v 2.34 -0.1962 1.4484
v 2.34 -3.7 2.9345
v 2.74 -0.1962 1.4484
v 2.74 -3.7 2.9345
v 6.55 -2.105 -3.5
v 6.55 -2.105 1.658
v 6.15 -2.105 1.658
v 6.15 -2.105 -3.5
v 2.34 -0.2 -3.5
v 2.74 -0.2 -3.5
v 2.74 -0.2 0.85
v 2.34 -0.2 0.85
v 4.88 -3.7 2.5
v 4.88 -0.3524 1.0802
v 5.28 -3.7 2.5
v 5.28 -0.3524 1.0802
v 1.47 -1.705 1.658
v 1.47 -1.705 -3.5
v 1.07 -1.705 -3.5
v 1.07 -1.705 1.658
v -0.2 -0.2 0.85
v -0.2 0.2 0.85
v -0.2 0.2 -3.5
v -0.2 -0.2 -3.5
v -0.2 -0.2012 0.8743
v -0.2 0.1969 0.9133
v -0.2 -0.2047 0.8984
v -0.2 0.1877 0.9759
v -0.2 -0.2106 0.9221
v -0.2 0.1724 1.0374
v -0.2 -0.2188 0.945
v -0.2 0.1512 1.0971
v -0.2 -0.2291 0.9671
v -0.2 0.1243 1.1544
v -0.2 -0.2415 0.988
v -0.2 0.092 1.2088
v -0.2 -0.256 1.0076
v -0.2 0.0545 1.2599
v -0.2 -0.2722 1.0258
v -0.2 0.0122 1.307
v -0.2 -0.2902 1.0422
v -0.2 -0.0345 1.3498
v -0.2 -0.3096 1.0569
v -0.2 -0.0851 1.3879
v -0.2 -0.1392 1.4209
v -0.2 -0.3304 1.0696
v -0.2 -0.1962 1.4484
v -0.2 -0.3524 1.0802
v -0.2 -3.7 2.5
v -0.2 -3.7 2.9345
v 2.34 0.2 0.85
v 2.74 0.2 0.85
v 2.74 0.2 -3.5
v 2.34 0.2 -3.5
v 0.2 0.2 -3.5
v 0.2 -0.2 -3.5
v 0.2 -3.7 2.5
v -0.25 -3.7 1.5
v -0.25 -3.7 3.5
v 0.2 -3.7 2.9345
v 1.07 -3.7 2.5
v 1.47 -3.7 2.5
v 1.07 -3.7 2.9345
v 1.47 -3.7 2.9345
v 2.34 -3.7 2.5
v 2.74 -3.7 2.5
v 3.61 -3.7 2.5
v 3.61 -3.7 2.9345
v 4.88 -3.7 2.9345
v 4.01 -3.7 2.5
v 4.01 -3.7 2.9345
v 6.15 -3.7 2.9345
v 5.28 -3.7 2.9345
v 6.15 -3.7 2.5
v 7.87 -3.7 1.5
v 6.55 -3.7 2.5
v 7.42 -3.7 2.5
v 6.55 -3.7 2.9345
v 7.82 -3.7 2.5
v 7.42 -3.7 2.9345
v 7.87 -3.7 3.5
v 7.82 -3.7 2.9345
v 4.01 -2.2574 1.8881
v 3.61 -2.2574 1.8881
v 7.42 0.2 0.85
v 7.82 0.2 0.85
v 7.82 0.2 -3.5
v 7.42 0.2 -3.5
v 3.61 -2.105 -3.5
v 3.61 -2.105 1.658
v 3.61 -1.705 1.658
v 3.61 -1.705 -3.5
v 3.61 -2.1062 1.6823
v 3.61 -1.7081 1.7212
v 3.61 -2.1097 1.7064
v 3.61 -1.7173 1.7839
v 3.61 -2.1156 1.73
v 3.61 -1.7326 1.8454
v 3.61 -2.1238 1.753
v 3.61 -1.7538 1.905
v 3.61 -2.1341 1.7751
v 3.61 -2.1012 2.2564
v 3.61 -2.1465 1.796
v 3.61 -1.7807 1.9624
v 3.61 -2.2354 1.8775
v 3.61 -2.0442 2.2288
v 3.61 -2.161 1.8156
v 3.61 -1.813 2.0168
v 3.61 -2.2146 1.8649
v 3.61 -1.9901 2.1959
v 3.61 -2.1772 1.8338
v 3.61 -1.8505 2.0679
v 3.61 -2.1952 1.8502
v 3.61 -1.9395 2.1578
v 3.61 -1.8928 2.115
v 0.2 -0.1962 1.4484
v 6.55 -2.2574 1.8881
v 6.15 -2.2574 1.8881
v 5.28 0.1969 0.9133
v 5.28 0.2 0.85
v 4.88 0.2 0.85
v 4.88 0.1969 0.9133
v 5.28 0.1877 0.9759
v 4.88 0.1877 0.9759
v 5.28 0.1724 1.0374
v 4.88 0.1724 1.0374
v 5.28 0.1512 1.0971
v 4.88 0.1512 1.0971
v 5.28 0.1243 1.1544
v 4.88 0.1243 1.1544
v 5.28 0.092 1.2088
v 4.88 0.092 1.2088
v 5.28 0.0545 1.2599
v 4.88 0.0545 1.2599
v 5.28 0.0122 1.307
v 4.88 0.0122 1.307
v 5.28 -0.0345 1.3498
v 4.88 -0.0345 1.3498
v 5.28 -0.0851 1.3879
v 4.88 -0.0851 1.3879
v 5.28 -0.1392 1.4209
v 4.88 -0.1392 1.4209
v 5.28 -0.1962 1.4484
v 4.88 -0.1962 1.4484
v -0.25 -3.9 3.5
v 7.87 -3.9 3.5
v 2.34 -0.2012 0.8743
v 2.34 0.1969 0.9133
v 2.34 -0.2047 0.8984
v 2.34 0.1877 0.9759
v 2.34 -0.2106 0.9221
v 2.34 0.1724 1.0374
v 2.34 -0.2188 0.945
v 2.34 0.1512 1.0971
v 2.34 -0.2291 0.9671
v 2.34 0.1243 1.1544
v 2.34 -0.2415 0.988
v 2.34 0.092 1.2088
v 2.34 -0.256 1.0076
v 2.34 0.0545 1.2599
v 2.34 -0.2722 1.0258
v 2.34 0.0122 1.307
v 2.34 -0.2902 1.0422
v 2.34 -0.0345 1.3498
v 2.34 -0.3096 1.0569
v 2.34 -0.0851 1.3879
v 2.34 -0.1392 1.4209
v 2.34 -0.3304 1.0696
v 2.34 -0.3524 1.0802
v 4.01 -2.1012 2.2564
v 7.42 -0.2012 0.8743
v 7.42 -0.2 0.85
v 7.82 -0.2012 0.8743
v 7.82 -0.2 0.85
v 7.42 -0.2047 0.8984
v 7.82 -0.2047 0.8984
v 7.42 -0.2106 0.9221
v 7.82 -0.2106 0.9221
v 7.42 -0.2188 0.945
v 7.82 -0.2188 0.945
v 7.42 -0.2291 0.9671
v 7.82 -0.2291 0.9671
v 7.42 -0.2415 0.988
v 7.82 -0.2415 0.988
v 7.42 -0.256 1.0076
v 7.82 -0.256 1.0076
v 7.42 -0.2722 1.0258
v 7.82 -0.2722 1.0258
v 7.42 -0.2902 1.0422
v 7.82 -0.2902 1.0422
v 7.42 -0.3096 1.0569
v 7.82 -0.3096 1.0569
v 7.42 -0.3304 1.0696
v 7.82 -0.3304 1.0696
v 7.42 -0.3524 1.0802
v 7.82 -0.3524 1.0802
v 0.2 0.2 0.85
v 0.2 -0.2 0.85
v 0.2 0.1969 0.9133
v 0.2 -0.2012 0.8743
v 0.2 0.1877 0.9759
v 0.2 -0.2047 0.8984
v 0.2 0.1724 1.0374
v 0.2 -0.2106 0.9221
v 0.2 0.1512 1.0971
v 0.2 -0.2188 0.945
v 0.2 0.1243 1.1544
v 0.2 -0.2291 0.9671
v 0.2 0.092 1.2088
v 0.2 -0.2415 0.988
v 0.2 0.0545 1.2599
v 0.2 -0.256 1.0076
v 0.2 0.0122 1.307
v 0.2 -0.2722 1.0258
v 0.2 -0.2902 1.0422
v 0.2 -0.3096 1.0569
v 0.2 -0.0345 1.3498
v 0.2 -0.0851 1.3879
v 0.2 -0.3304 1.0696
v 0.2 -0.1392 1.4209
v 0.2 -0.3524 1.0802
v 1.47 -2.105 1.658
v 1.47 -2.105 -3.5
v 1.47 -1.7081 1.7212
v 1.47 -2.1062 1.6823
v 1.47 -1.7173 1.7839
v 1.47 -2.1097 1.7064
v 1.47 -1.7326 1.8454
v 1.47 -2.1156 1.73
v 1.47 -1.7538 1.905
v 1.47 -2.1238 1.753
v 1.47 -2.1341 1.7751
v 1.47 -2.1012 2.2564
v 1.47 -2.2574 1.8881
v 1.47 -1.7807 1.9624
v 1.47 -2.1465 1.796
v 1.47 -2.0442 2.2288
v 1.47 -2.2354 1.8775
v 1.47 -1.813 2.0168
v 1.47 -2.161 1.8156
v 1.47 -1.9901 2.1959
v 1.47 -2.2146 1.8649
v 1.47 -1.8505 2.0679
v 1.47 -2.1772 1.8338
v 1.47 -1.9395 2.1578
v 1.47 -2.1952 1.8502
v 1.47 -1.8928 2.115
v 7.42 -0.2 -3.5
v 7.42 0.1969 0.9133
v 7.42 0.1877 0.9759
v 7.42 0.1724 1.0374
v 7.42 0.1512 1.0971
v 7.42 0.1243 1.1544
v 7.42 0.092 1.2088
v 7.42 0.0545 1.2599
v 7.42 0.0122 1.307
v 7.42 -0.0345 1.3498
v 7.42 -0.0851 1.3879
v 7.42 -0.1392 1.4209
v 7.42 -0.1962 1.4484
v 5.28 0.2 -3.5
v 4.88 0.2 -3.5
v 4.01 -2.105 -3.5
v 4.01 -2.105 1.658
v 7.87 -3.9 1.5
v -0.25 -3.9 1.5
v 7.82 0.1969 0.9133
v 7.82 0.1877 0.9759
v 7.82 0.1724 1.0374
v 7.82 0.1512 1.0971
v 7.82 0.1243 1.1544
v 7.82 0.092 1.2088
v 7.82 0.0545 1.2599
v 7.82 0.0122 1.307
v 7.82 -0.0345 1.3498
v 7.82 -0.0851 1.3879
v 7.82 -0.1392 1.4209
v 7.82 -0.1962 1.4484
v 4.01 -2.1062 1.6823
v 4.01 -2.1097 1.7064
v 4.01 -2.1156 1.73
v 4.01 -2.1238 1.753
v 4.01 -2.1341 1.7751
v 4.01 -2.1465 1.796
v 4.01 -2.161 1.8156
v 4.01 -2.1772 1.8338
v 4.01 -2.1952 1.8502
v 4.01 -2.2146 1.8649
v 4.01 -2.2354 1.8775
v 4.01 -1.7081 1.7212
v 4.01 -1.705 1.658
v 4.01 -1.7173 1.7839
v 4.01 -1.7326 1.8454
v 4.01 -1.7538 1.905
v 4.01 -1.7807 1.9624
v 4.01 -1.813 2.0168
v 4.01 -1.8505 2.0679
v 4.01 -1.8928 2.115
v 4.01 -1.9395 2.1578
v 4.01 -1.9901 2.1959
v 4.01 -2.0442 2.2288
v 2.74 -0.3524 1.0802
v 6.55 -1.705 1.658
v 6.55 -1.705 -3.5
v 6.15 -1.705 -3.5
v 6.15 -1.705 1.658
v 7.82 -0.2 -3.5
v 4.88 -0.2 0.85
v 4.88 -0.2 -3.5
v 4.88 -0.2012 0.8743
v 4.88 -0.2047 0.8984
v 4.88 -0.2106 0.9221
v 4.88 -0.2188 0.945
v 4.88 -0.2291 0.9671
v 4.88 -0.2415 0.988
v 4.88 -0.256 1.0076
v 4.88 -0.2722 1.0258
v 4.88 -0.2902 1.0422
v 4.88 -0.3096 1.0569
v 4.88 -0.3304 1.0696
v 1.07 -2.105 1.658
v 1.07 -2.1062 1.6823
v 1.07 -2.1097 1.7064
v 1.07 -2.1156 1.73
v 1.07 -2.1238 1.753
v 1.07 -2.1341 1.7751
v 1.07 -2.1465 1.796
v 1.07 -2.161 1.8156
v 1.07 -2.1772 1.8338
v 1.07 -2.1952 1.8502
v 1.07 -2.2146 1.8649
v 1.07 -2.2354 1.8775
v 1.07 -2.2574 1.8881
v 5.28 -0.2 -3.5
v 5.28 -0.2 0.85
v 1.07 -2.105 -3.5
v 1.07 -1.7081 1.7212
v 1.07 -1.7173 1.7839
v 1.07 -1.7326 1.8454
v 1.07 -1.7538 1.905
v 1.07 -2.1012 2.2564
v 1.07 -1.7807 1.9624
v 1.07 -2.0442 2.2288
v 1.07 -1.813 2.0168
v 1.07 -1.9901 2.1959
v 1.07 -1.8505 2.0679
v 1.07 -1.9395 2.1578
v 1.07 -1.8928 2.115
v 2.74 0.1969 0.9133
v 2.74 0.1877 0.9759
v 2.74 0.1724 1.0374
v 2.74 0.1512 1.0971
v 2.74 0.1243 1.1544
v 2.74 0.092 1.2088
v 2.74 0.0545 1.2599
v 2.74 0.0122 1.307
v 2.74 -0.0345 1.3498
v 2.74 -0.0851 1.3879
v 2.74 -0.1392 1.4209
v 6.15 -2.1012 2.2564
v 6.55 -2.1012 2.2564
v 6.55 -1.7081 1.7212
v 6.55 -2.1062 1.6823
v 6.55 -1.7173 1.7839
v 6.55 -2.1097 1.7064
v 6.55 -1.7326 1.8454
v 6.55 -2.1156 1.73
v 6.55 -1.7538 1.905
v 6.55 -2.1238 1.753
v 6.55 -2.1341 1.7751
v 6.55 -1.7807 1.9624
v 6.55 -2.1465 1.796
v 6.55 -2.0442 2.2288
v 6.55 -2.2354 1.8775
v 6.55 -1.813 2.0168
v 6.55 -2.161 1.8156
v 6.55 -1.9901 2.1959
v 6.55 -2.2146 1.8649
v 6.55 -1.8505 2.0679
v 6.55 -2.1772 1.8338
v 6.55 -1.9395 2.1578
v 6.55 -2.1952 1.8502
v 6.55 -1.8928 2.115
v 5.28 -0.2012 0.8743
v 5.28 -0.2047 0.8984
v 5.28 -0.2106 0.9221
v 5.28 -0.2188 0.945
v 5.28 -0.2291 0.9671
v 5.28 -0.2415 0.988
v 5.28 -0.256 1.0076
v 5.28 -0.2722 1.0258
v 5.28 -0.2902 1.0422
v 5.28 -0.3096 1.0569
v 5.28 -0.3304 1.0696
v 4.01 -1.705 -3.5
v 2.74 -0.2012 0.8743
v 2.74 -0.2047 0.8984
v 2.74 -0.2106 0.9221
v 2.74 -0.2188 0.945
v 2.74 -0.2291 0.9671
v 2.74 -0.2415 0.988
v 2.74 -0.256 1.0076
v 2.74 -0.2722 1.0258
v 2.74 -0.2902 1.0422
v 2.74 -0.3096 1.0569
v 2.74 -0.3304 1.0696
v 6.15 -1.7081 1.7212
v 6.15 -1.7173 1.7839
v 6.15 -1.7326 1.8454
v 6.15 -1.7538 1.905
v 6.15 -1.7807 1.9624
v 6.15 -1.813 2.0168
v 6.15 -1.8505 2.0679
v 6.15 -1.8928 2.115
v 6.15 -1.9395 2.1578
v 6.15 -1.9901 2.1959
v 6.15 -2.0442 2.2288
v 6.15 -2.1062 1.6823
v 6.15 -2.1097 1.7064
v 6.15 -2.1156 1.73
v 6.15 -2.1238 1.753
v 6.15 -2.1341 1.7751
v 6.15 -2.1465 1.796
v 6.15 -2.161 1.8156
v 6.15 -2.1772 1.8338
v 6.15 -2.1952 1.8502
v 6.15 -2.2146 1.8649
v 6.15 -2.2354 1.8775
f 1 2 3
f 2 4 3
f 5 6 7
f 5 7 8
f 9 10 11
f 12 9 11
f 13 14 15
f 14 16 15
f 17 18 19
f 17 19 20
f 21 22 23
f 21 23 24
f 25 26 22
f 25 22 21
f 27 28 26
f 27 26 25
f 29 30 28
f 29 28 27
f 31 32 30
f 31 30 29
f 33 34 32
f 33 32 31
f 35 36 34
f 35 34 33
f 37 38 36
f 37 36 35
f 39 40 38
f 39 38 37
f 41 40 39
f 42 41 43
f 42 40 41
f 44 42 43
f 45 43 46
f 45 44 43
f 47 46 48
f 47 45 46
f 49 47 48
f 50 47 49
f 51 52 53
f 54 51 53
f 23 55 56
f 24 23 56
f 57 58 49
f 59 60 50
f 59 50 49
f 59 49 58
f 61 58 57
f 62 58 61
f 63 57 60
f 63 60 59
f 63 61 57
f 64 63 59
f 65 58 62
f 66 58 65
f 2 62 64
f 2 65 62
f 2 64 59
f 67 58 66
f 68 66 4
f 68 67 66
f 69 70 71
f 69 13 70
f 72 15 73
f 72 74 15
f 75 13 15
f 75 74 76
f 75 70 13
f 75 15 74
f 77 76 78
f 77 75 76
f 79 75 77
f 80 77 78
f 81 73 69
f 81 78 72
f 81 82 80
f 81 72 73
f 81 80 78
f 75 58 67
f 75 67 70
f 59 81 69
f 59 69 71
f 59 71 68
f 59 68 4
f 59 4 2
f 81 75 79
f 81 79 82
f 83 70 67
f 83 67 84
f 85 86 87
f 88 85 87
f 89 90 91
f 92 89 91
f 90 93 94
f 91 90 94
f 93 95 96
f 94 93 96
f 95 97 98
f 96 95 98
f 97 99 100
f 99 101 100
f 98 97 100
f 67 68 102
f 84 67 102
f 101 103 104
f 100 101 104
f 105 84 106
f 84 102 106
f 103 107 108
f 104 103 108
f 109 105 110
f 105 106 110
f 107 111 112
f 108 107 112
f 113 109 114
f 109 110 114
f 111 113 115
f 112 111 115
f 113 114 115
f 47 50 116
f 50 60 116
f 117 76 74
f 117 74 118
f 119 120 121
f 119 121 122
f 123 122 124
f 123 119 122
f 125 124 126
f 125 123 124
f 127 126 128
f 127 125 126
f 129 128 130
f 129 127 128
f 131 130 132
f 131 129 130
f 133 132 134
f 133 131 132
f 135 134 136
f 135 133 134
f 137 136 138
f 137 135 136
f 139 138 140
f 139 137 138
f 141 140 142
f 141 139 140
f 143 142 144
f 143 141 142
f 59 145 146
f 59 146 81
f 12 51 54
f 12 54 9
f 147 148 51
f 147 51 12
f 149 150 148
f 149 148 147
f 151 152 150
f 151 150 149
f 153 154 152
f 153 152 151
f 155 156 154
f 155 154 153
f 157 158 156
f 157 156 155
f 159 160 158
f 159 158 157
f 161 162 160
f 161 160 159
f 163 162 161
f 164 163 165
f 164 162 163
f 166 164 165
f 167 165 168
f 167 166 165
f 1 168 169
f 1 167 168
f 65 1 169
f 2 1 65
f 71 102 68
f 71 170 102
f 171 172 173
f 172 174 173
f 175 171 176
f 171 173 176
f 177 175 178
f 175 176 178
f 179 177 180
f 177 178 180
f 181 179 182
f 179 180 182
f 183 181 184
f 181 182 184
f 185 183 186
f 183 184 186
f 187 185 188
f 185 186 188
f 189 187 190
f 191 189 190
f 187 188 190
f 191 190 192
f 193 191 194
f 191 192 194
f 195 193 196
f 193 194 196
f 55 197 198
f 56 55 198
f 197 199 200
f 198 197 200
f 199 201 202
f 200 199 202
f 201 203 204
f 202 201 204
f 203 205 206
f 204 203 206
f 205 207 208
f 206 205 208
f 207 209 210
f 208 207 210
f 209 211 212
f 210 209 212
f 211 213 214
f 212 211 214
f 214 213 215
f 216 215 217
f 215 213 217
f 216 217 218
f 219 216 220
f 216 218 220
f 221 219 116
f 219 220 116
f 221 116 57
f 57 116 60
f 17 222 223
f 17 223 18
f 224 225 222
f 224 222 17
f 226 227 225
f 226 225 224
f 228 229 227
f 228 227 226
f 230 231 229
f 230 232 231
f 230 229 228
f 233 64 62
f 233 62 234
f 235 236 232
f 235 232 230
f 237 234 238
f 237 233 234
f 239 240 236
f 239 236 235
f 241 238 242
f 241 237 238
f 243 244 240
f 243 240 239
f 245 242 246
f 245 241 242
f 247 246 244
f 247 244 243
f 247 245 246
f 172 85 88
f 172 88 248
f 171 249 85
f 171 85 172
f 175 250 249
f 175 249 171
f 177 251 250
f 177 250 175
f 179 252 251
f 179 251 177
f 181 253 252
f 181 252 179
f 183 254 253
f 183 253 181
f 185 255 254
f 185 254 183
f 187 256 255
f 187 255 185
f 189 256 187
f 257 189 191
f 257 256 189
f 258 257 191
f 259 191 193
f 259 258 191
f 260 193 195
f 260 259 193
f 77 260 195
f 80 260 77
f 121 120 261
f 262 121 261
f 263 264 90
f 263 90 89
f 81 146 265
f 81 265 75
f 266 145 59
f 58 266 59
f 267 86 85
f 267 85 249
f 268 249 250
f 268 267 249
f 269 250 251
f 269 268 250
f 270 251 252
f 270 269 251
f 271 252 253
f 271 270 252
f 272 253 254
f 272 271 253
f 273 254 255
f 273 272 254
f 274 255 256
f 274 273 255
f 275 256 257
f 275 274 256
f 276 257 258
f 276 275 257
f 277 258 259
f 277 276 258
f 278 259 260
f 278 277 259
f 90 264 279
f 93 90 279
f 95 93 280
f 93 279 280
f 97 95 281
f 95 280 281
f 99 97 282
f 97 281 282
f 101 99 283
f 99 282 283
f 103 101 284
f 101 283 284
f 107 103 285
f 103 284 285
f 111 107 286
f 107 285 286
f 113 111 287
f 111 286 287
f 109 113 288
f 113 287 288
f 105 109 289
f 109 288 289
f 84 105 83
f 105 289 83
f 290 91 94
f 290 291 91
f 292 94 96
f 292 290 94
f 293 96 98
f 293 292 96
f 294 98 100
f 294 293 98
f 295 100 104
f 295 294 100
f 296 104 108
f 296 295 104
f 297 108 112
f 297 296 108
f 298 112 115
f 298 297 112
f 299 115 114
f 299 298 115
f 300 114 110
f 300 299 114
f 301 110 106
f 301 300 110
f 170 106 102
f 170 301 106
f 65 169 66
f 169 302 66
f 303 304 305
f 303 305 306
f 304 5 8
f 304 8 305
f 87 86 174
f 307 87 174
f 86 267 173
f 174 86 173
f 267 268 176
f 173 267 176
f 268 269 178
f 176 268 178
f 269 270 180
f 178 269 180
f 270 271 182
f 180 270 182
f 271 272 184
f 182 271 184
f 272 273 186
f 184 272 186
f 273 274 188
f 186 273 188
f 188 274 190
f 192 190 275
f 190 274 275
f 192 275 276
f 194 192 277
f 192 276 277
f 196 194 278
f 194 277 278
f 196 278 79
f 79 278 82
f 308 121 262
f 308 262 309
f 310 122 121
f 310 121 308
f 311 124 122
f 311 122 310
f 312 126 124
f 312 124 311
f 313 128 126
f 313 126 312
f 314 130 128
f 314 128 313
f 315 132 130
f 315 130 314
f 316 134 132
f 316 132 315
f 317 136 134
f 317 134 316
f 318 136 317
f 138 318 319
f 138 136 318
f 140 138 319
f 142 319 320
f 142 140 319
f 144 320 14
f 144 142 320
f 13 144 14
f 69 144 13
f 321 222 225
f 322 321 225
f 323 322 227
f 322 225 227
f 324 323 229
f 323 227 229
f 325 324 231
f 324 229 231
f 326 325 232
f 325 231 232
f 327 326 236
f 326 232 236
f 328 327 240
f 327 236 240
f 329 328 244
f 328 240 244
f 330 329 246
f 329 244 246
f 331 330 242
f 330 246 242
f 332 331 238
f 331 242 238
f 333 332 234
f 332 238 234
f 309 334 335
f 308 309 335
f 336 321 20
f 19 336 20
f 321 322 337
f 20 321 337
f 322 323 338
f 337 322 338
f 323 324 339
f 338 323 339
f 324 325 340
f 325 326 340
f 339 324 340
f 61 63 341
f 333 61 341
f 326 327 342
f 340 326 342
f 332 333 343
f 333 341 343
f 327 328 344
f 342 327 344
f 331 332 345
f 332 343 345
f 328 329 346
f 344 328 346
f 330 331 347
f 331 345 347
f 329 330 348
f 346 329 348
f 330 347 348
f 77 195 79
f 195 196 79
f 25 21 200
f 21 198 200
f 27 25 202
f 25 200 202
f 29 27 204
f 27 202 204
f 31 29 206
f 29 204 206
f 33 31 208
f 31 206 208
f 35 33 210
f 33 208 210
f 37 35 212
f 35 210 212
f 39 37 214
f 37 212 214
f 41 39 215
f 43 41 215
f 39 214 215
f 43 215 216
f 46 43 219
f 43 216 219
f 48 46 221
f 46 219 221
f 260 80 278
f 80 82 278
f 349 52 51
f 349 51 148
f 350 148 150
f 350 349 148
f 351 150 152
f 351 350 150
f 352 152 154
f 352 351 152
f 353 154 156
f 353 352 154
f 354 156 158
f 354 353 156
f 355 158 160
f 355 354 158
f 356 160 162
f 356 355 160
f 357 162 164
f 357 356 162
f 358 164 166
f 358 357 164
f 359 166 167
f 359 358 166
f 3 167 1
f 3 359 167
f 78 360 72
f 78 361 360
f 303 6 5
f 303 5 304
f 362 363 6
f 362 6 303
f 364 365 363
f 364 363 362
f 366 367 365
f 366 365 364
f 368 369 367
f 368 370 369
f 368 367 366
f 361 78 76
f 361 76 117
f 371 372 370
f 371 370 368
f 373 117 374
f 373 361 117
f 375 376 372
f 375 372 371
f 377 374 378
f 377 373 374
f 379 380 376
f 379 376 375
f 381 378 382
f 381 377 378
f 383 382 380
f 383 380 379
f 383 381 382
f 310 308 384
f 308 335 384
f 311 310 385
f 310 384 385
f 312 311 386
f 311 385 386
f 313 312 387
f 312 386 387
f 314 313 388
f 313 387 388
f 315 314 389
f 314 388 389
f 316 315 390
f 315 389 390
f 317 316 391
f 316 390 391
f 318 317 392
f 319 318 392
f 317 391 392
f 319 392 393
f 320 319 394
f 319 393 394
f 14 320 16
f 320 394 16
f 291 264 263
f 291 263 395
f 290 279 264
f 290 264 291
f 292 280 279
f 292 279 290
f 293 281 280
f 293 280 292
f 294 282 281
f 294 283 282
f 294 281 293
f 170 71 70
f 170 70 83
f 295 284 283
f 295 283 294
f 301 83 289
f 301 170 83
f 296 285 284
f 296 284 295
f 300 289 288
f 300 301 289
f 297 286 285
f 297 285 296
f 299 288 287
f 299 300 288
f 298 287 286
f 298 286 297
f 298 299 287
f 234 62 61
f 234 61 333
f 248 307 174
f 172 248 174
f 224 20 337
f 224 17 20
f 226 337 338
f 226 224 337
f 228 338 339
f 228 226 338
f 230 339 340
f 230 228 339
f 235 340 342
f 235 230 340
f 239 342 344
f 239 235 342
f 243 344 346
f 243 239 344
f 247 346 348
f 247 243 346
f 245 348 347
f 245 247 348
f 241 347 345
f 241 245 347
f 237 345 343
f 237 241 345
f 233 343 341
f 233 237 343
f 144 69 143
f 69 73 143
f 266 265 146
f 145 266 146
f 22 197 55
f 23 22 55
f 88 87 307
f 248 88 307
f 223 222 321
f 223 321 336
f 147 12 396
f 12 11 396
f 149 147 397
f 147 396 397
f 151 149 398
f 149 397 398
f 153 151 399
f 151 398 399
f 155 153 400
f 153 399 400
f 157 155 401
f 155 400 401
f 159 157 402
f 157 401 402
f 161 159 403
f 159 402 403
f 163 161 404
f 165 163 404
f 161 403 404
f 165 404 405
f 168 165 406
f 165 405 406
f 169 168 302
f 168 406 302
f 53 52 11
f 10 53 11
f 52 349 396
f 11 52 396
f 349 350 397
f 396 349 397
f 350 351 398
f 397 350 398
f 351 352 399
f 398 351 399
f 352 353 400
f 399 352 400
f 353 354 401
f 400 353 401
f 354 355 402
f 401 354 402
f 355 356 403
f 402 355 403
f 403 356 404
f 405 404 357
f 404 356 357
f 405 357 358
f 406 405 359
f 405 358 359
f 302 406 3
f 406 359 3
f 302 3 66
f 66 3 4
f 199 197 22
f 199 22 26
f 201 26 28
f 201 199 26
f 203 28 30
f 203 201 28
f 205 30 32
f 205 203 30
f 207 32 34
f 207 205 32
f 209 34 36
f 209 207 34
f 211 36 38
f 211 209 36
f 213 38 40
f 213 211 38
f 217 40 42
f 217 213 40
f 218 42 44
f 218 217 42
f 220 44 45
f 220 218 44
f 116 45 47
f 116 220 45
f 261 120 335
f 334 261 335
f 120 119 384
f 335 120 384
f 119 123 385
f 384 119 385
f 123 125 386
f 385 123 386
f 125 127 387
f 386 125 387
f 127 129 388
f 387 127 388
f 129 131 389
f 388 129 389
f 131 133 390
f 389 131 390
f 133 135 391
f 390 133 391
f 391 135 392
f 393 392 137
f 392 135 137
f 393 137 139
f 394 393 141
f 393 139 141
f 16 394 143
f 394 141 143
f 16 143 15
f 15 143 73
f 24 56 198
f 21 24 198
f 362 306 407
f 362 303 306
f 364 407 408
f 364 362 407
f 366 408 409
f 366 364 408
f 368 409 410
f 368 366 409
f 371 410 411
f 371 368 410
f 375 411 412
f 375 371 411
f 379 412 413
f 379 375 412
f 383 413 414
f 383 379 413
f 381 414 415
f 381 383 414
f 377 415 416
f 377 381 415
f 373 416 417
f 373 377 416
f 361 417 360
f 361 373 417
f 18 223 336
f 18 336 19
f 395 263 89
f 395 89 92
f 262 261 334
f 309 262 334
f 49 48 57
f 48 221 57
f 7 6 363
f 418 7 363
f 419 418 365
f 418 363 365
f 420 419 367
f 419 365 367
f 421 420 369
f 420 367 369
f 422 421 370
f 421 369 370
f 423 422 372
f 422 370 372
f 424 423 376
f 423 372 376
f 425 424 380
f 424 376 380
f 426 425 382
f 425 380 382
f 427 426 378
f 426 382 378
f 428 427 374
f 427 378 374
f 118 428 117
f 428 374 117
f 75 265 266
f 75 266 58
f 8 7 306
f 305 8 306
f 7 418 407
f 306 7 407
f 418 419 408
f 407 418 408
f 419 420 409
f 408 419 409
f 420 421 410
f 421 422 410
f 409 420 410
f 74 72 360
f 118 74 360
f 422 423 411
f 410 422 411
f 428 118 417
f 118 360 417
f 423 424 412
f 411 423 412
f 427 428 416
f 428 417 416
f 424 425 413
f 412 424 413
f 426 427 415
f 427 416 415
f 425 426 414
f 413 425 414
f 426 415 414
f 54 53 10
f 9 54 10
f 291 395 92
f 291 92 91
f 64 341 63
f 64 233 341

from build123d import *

# Parameters (mm, degrees)
SKETCH009_W            = 0.2
SKETCH009_H            = 2
PAD004_DEPTH           = 4.06
PAD005_DEPTH           = 0.2
LINEARPATTERN_COUNT    = 4
LINEARPATTERN_PITCH    = 2.54
PAD006_DEPTH           = 0.2
LINEARPATTERN001_COUNT = 3
LINEARPATTERN001_PITCH = 2.54


with BuildPart() as part:
    # Sketch009 (on DatumPlane) → Pad004 (new body, symmetric)
    with BuildSketch(Plane.YZ.offset(3.81)):
        with Locations((-3.8, 2.5)):
            Rectangle(SKETCH009_W, SKETCH009_H)
    extrude(amount=PAD004_DEPTH, both=True)

    # Sketch010 → Pad005 (join, symmetric)
    with BuildSketch(Plane.YZ):
        with BuildLine():
            Line((-0.2, -3.5), (-0.2, 0.85))
            ThreePointArc((-0.2, 0.85), (-0.241548, 0.988014), (-0.352383, 1.080154))
            Line((-0.352383, 1.080154), (-3.7, 2.5))
            Line((-3.7, 2.5), (-3.7, 2.934491))
            Line((-3.7, 2.934491), (-0.196196, 1.448401))
            ThreePointArc((0.2, 0.85), (0.091974, 1.208837), (-0.196196, 1.448401))
            Line((0.2, 0.85), (0.2, -3.5))
            Line((0.2, -3.5), (-0.2, -3.5))
        make_face()
    pad005 = extrude(amount=PAD005_DEPTH, both=True)

    # LinearPattern: Pad005 ×4
    with Locations(*[(i * LINEARPATTERN_PITCH, 0, 0) for i in range(1, LINEARPATTERN_COUNT)]):
        add(pad005)

    # Sketch011 (on DatumPlane) → Pad006 (join, symmetric)
    with BuildSketch(Plane.YZ.offset(1.27)):
        with BuildLine():
            Line((-3.7, 2.934491), (-3.7, 2.5))
            Line((-3.7, 2.5), (-2.257383, 1.888134))
            ThreePointArc((-2.105, 1.65798), (-2.146548, 1.795994), (-2.257383, 1.888134))
            Line((-2.105, 1.65798), (-2.105, -3.5))
            Line((-2.105, -3.5), (-1.705, -3.5))
            Line((-1.705, -3.5), (-1.705, 1.65798))
            ThreePointArc((-1.705, 1.65798), (-1.813026, 2.016816), (-2.101196, 2.256381))
            Line((-2.101196, 2.256381), (-3.7, 2.934491))
        make_face()
    pad006 = extrude(amount=PAD006_DEPTH, both=True)

    # LinearPattern001: Pad006 ×3
    with Locations(*[(i * LINEARPATTERN001_PITCH, 0, 0) for i in range(1, LINEARPATTERN001_COUNT)]):
        add(pad006)


solid = part.part
